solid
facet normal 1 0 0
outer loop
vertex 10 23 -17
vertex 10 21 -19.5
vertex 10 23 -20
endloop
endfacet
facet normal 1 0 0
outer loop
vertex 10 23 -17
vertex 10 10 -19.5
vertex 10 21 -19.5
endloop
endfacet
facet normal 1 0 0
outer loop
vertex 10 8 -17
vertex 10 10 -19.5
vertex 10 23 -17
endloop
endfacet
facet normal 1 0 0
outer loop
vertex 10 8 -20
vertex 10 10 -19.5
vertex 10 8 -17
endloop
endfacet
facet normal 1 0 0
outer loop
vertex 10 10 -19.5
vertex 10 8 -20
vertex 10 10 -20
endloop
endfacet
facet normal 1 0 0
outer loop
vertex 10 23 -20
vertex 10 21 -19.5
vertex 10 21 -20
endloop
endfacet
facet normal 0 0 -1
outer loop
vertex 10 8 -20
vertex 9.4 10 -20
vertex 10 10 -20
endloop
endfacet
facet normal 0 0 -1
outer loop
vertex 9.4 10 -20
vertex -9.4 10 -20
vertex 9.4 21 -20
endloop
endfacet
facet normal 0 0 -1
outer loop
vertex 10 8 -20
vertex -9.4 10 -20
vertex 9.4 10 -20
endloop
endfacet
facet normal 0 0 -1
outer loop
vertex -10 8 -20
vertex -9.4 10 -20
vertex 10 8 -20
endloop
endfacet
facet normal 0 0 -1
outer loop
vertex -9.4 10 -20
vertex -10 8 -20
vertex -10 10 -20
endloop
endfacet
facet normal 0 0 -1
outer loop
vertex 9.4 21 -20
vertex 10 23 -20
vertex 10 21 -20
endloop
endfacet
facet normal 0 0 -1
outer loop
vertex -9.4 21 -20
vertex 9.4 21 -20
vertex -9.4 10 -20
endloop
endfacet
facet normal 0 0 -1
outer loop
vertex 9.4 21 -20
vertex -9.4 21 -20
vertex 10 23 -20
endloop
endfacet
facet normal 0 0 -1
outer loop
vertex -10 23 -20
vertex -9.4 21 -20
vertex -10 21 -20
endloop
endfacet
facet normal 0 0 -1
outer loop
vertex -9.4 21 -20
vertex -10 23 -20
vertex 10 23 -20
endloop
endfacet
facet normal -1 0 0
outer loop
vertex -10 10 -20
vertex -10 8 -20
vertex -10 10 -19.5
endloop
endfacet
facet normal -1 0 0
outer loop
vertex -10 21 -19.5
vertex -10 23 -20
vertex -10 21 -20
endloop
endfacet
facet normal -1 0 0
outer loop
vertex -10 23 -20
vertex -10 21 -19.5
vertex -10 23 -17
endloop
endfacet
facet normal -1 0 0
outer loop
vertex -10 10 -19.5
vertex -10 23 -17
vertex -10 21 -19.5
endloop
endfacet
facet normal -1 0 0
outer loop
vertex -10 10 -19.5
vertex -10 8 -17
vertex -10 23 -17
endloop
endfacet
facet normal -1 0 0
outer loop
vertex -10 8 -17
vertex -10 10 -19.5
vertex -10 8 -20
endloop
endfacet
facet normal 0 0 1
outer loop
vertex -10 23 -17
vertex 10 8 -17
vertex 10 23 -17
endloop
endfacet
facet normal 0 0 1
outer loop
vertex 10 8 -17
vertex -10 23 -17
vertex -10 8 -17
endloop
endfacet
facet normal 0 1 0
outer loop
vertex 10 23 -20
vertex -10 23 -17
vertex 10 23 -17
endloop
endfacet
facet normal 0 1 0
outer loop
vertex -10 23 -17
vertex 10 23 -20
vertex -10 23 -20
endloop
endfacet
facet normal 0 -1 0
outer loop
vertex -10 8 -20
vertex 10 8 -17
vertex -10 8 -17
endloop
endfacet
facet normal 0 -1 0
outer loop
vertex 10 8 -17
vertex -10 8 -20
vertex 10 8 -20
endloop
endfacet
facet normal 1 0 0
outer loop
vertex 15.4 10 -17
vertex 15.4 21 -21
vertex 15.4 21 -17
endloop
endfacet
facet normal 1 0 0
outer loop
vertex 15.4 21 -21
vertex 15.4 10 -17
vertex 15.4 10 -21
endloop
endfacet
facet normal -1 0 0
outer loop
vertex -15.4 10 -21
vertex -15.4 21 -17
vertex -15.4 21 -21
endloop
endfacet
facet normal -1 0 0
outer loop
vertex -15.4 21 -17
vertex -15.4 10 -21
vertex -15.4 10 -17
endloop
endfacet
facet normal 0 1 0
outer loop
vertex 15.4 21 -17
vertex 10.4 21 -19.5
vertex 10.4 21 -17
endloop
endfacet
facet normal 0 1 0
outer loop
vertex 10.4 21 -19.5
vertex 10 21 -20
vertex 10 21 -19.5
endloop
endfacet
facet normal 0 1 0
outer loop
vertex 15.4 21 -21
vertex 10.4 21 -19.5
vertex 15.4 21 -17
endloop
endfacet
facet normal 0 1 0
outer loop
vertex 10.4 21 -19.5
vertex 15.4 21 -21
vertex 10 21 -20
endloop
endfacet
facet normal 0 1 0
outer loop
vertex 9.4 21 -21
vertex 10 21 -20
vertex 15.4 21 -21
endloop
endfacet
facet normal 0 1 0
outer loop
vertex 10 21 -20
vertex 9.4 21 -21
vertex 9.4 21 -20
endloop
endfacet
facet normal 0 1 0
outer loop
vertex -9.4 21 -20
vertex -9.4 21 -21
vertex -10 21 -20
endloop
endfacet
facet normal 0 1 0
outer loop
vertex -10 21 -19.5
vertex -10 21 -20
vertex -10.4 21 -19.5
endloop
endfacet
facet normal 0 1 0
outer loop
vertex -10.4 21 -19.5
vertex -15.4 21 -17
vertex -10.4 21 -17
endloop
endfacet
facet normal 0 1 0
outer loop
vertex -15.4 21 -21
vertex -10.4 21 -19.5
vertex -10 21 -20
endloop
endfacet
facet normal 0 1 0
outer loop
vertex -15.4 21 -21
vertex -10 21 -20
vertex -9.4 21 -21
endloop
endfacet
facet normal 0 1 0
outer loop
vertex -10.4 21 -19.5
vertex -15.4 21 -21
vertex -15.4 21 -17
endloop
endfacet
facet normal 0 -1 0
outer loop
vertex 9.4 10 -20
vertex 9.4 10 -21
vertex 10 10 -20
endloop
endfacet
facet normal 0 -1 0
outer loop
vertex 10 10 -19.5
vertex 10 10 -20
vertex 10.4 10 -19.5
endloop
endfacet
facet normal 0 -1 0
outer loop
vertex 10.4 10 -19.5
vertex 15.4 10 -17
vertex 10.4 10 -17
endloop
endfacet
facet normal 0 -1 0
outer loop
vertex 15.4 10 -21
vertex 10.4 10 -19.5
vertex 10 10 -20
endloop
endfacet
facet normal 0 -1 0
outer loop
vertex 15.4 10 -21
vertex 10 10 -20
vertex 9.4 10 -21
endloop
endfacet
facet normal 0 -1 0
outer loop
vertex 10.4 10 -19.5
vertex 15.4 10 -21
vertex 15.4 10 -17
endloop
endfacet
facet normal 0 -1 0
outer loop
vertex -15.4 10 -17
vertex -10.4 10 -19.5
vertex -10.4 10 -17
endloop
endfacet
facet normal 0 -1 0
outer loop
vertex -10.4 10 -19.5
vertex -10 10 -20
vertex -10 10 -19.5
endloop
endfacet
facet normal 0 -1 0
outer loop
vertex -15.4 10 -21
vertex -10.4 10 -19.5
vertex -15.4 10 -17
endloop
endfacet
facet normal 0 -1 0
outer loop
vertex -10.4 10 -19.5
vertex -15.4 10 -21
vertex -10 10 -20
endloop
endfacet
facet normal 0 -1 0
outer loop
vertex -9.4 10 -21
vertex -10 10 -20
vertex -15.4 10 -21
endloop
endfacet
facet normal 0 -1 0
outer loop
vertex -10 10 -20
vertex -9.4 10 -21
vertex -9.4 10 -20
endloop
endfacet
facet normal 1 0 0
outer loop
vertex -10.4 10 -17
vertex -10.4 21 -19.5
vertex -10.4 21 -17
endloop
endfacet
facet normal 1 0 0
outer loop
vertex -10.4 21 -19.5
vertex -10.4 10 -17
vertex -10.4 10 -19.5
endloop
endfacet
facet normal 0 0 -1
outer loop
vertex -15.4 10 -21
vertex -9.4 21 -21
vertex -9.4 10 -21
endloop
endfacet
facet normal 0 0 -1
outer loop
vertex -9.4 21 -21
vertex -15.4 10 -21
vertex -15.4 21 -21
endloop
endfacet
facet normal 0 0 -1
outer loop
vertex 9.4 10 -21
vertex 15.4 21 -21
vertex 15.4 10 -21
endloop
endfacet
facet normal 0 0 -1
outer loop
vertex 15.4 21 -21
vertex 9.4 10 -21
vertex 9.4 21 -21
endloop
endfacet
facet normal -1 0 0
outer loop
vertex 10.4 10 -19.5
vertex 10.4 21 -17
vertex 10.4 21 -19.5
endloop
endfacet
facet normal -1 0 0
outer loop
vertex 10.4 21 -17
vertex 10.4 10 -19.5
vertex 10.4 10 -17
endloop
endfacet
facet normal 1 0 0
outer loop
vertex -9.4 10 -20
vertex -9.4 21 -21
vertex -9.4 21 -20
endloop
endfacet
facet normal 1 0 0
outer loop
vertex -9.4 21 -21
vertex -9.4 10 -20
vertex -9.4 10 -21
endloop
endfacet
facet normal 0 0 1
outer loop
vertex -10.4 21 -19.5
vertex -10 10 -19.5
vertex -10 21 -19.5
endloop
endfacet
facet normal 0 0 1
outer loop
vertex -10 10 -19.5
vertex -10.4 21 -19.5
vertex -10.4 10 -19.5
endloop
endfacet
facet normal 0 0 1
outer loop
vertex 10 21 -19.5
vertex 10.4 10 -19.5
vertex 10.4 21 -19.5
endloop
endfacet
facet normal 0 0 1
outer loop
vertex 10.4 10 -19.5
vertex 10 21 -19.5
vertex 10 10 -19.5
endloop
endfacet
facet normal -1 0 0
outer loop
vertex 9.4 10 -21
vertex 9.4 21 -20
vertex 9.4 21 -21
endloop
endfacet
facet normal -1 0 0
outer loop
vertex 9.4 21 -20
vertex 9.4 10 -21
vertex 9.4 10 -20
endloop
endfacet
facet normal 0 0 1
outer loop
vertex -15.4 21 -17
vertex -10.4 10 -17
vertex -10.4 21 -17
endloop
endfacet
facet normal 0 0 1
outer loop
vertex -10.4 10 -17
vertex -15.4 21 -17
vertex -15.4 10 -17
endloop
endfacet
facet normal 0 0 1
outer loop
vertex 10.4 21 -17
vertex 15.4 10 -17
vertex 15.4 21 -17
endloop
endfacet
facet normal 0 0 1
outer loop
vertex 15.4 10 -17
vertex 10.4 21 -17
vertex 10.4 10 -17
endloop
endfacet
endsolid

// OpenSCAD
// file: candidate_triangular_corner_fills.scad
// Candidate v1.3: four triangular concave-corner fill blocks.
//
// Base: accepted v0.7 eaves12 geometry. v0.9/v1.0/v1.1/v1.2 are not
// imported. Each corner block is a real triangular prism: broad at the roof,
// tapering continuously toward z=0, and overlapping the U side wall.

use <../perpendicular-u-joint-guard-v0.7/perpendicular_double_u_guard.scad>;

$fn = 48;
PART = "candidate_iso";

// Explicit v0.7 interface values.
roof_x_outer = 27.4;       // accepted eaves12 roof: -27.4..+27.4
side_wall_x_outer = 15.4;  // existing side-wall outer edge
blue_tube_x_outer = 10.0;  // blue lower 20x20 tube half-width
plate_y_inner = 10.0;
plate_y_outer = 21.0;
plate_depth_y = plate_y_outer - plate_y_inner; // 11 mm per front/back U plate

// The top edge is 0.5 mm inside the roof volume (roof underside z=21), and
// the lower point enters the side wall by 1 mm in X.  The XZ area therefore
// has positive overlap at both ends, not edge-only contact.
triangle_top_z = 21.5;
triangle_bottom_z = 0.0;
triangle_roof_overlap_z = triangle_top_z - 21.0;
triangle_side_overlap_x = 1.0;
triangle_inner_x = side_wall_x_outer - triangle_side_overlap_x; // 14.4

// Bottom retaining-hook contract copied from v0.7 for explicit verification.
hook_height_z = 1.5;
u_bottom_z = -21.0;
hook_top_z = u_bottom_z + hook_height_z; // -19.5

assert(plate_depth_y == 11, "每个三角块的前后板深必须是 11 mm");
assert(triangle_top_z > 21 && triangle_bottom_z == 0,
       "三角块上端必须搭入屋檐、下端落到 z=0");
assert(triangle_inner_x > blue_tube_x_outer,
       "三角块下端不得进入蓝色方管 x=-10..+10 包络");
assert(triangle_side_overlap_x > 0 && triangle_roof_overlap_z > 0,
       "三角块必须与屋檐和侧墙都有正重叠");
assert(hook_height_z == 1.5 && u_bottom_z == -21 && hook_top_z == -19.5,
       "底部卡脚必须保持 z=-21..-19.5");

// A polygon in XZ is extruded only through the corresponding front/back U
// plate. The center y=-10..+10 passage remains open.
module triangular_fill_xz(points, yc) {
    translate([0, yc, 0])
        rotate([90, 0, 0])
            linear_extrude(height = plate_depth_y,
                           center = true,
                           convexity = 10)
                polygon(points = points);
}

module front_neg_x_triangle() {
    // -X roof end -> +X inward. Top wide, lower point at the side wall.
    triangular_fill_xz([
        [-roof_x_outer, 21.0],
        [-triangle_inner_x, triangle_top_z],
        [-triangle_inner_x, triangle_bottom_z]
    ], (plate_y_inner + plate_y_outer) / 2);
}

module front_pos_x_triangle() {
    // +X roof end -> -X inward. Mirrored triangle.
    triangular_fill_xz([
        [roof_x_outer, 21.0],
        [triangle_inner_x, triangle_top_z],
        [triangle_inner_x, triangle_bottom_z]
    ], (plate_y_inner + plate_y_outer) / 2);
}

module back_neg_x_triangle() {
    triangular_fill_xz([
        [-roof_x_outer, 21.0],
        [-triangle_inner_x, triangle_top_z],
        [-triangle_inner_x, triangle_bottom_z]
    ], -(plate_y_inner + plate_y_outer) / 2);
}

module back_pos_x_triangle() {
    triangular_fill_xz([
        [roof_x_outer, 21.0],
        [triangle_inner_x, triangle_top_z],
        [triangle_inner_x, triangle_bottom_z]
    ], -(plate_y_inner + plate_y_outer) / 2);
}

module front_two_triangular_fills() {
    union() {
        front_neg_x_triangle();
        front_pos_x_triangle();
    }
}

module back_two_triangular_fills() {
    union() {
        back_neg_x_triangle();
        back_pos_x_triangle();
    }
}

module all_four_triangular_fills() {
    union() {
        front_two_triangular_fills();
        back_two_triangular_fills();
    }
}

module candidate_print_solid() {
    // Final hole operation is deliberately after the complete four-block
    // union; this preserves a true Z through-hole and the round nut pocket.
    difference() {
        union() {
            double_u_clip();
            all_four_triangular_fills();
        }
        vertical_screw_relief();
    }
}

module candidate_clip() {
    candidate_print_solid();
}

module candidate_assembly_iso() {
    upper_long_tube();
    lower_cross_tube();
    color([0.96, 0.39, 0.08]) double_u_clip();
    color([0.86, 0.13, 0.08]) front_two_triangular_fills();
    color([0.62, 0.12, 0.52]) back_two_triangular_fills();
    vertical_joint_screw();
}

module candidate_front_xz() {
    lower_cross_tube();
    color([0.96, 0.39, 0.08]) double_u_clip();
    color([0.86, 0.13, 0.08]) front_two_triangular_fills();
    vertical_joint_screw();
}

module candidate_back_xz() {
    lower_cross_tube();
    color([0.96, 0.39, 0.08]) double_u_clip();
    color([0.62, 0.12, 0.52]) back_two_triangular_fills();
    vertical_joint_screw();
}

module candidate_top_slice() {
    // At z=-0.5..2.5 the four blocks show their two front/back 11 mm bands;
    // the blue tube and the central y gap remain visible.
    slice_box = 200;
    color([0.28, 0.45, 0.78])
        intersection() {
            lower_cross_tube();
            translate([-slice_box / 2, -slice_box / 2, -0.5])
                cube([slice_box, slice_box, 3.0]);
        }
    color([0.96, 0.39, 0.08])
        intersection() {
            double_u_clip();
            translate([-slice_box / 2, -slice_box / 2, -0.5])
                cube([slice_box, slice_box, 3.0]);
        }
    color([0.86, 0.13, 0.08])
        intersection() {
            front_two_triangular_fills();
            translate([-slice_box / 2, -slice_box / 2, -0.5])
                cube([slice_box, slice_box, 3.0]);
        }
    color([0.62, 0.12, 0.52])
        intersection() {
            back_two_triangular_fills();
            translate([-slice_box / 2, -slice_box / 2, -0.5])
                cube([slice_box, slice_box, 3.0]);
        }
}

module candidate_hole_section() {
    // Center y=0 section: the bore and round nut pocket are shown without
    // confusing them with the bottom hook, which is outside this section.
    intersection() {
        candidate_print_solid();
        translate([-100, -0.4, -100]) cube([200, 0.8, 200]);
    }
}

module candidate_hook_check() {
    // Isolated lower detail: exact imported v0.7 U plate and blue tube, with
    // hook volumes highlighted only for review. This is not the print union.
    detail_box = 200;
    detail_z0 = -22;
    detail_h = 5;
    detail_y0 = 8;
    detail_ydepth = 15;
    intersection() {
        lower_cross_tube();
        translate([-detail_box / 2, detail_y0, detail_z0])
            cube([detail_box, detail_ydepth, detail_h]);
    }
    color([0.96, 0.39, 0.08])
        intersection() {
            u_plate(plate_y_inner, plate_y_outer);
            translate([-detail_box / 2, detail_y0, detail_z0])
                cube([detail_box, detail_ydepth, detail_h]);
        }
    color([0.20, 0.78, 0.20])
        intersection() {
            union() {
                translate([-13.65, 15.5, -20.25])
                    cube([3.5, 11, 1.5], center = true);
                translate([13.65, 15.5, -20.25])
                    cube([3.5, 11, 1.5], center = true);
            }
            translate([-detail_box / 2, detail_y0, detail_z0])
                cube([detail_box, detail_ydepth, detail_h]);
        }
}

if (PART == "candidate_clip") {
    candidate_clip();
} else if (PART == "candidate_front_xz") {
    candidate_front_xz();
} else if (PART == "candidate_back_xz") {
    candidate_back_xz();
} else if (PART == "candidate_top_slice") {
    candidate_top_slice();
} else if (PART == "candidate_hole_section") {
    candidate_hole_section();
} else if (PART == "candidate_hook_check") {
    candidate_hook_check();
} else {
    candidate_assembly_iso();
}
// main file
// v1.3 isolated real bottom-hook detail; separate from the centre bore view.
use <candidate_triangular_corner_fills.scad>;
$fn=48;
candidate_hook_check();
